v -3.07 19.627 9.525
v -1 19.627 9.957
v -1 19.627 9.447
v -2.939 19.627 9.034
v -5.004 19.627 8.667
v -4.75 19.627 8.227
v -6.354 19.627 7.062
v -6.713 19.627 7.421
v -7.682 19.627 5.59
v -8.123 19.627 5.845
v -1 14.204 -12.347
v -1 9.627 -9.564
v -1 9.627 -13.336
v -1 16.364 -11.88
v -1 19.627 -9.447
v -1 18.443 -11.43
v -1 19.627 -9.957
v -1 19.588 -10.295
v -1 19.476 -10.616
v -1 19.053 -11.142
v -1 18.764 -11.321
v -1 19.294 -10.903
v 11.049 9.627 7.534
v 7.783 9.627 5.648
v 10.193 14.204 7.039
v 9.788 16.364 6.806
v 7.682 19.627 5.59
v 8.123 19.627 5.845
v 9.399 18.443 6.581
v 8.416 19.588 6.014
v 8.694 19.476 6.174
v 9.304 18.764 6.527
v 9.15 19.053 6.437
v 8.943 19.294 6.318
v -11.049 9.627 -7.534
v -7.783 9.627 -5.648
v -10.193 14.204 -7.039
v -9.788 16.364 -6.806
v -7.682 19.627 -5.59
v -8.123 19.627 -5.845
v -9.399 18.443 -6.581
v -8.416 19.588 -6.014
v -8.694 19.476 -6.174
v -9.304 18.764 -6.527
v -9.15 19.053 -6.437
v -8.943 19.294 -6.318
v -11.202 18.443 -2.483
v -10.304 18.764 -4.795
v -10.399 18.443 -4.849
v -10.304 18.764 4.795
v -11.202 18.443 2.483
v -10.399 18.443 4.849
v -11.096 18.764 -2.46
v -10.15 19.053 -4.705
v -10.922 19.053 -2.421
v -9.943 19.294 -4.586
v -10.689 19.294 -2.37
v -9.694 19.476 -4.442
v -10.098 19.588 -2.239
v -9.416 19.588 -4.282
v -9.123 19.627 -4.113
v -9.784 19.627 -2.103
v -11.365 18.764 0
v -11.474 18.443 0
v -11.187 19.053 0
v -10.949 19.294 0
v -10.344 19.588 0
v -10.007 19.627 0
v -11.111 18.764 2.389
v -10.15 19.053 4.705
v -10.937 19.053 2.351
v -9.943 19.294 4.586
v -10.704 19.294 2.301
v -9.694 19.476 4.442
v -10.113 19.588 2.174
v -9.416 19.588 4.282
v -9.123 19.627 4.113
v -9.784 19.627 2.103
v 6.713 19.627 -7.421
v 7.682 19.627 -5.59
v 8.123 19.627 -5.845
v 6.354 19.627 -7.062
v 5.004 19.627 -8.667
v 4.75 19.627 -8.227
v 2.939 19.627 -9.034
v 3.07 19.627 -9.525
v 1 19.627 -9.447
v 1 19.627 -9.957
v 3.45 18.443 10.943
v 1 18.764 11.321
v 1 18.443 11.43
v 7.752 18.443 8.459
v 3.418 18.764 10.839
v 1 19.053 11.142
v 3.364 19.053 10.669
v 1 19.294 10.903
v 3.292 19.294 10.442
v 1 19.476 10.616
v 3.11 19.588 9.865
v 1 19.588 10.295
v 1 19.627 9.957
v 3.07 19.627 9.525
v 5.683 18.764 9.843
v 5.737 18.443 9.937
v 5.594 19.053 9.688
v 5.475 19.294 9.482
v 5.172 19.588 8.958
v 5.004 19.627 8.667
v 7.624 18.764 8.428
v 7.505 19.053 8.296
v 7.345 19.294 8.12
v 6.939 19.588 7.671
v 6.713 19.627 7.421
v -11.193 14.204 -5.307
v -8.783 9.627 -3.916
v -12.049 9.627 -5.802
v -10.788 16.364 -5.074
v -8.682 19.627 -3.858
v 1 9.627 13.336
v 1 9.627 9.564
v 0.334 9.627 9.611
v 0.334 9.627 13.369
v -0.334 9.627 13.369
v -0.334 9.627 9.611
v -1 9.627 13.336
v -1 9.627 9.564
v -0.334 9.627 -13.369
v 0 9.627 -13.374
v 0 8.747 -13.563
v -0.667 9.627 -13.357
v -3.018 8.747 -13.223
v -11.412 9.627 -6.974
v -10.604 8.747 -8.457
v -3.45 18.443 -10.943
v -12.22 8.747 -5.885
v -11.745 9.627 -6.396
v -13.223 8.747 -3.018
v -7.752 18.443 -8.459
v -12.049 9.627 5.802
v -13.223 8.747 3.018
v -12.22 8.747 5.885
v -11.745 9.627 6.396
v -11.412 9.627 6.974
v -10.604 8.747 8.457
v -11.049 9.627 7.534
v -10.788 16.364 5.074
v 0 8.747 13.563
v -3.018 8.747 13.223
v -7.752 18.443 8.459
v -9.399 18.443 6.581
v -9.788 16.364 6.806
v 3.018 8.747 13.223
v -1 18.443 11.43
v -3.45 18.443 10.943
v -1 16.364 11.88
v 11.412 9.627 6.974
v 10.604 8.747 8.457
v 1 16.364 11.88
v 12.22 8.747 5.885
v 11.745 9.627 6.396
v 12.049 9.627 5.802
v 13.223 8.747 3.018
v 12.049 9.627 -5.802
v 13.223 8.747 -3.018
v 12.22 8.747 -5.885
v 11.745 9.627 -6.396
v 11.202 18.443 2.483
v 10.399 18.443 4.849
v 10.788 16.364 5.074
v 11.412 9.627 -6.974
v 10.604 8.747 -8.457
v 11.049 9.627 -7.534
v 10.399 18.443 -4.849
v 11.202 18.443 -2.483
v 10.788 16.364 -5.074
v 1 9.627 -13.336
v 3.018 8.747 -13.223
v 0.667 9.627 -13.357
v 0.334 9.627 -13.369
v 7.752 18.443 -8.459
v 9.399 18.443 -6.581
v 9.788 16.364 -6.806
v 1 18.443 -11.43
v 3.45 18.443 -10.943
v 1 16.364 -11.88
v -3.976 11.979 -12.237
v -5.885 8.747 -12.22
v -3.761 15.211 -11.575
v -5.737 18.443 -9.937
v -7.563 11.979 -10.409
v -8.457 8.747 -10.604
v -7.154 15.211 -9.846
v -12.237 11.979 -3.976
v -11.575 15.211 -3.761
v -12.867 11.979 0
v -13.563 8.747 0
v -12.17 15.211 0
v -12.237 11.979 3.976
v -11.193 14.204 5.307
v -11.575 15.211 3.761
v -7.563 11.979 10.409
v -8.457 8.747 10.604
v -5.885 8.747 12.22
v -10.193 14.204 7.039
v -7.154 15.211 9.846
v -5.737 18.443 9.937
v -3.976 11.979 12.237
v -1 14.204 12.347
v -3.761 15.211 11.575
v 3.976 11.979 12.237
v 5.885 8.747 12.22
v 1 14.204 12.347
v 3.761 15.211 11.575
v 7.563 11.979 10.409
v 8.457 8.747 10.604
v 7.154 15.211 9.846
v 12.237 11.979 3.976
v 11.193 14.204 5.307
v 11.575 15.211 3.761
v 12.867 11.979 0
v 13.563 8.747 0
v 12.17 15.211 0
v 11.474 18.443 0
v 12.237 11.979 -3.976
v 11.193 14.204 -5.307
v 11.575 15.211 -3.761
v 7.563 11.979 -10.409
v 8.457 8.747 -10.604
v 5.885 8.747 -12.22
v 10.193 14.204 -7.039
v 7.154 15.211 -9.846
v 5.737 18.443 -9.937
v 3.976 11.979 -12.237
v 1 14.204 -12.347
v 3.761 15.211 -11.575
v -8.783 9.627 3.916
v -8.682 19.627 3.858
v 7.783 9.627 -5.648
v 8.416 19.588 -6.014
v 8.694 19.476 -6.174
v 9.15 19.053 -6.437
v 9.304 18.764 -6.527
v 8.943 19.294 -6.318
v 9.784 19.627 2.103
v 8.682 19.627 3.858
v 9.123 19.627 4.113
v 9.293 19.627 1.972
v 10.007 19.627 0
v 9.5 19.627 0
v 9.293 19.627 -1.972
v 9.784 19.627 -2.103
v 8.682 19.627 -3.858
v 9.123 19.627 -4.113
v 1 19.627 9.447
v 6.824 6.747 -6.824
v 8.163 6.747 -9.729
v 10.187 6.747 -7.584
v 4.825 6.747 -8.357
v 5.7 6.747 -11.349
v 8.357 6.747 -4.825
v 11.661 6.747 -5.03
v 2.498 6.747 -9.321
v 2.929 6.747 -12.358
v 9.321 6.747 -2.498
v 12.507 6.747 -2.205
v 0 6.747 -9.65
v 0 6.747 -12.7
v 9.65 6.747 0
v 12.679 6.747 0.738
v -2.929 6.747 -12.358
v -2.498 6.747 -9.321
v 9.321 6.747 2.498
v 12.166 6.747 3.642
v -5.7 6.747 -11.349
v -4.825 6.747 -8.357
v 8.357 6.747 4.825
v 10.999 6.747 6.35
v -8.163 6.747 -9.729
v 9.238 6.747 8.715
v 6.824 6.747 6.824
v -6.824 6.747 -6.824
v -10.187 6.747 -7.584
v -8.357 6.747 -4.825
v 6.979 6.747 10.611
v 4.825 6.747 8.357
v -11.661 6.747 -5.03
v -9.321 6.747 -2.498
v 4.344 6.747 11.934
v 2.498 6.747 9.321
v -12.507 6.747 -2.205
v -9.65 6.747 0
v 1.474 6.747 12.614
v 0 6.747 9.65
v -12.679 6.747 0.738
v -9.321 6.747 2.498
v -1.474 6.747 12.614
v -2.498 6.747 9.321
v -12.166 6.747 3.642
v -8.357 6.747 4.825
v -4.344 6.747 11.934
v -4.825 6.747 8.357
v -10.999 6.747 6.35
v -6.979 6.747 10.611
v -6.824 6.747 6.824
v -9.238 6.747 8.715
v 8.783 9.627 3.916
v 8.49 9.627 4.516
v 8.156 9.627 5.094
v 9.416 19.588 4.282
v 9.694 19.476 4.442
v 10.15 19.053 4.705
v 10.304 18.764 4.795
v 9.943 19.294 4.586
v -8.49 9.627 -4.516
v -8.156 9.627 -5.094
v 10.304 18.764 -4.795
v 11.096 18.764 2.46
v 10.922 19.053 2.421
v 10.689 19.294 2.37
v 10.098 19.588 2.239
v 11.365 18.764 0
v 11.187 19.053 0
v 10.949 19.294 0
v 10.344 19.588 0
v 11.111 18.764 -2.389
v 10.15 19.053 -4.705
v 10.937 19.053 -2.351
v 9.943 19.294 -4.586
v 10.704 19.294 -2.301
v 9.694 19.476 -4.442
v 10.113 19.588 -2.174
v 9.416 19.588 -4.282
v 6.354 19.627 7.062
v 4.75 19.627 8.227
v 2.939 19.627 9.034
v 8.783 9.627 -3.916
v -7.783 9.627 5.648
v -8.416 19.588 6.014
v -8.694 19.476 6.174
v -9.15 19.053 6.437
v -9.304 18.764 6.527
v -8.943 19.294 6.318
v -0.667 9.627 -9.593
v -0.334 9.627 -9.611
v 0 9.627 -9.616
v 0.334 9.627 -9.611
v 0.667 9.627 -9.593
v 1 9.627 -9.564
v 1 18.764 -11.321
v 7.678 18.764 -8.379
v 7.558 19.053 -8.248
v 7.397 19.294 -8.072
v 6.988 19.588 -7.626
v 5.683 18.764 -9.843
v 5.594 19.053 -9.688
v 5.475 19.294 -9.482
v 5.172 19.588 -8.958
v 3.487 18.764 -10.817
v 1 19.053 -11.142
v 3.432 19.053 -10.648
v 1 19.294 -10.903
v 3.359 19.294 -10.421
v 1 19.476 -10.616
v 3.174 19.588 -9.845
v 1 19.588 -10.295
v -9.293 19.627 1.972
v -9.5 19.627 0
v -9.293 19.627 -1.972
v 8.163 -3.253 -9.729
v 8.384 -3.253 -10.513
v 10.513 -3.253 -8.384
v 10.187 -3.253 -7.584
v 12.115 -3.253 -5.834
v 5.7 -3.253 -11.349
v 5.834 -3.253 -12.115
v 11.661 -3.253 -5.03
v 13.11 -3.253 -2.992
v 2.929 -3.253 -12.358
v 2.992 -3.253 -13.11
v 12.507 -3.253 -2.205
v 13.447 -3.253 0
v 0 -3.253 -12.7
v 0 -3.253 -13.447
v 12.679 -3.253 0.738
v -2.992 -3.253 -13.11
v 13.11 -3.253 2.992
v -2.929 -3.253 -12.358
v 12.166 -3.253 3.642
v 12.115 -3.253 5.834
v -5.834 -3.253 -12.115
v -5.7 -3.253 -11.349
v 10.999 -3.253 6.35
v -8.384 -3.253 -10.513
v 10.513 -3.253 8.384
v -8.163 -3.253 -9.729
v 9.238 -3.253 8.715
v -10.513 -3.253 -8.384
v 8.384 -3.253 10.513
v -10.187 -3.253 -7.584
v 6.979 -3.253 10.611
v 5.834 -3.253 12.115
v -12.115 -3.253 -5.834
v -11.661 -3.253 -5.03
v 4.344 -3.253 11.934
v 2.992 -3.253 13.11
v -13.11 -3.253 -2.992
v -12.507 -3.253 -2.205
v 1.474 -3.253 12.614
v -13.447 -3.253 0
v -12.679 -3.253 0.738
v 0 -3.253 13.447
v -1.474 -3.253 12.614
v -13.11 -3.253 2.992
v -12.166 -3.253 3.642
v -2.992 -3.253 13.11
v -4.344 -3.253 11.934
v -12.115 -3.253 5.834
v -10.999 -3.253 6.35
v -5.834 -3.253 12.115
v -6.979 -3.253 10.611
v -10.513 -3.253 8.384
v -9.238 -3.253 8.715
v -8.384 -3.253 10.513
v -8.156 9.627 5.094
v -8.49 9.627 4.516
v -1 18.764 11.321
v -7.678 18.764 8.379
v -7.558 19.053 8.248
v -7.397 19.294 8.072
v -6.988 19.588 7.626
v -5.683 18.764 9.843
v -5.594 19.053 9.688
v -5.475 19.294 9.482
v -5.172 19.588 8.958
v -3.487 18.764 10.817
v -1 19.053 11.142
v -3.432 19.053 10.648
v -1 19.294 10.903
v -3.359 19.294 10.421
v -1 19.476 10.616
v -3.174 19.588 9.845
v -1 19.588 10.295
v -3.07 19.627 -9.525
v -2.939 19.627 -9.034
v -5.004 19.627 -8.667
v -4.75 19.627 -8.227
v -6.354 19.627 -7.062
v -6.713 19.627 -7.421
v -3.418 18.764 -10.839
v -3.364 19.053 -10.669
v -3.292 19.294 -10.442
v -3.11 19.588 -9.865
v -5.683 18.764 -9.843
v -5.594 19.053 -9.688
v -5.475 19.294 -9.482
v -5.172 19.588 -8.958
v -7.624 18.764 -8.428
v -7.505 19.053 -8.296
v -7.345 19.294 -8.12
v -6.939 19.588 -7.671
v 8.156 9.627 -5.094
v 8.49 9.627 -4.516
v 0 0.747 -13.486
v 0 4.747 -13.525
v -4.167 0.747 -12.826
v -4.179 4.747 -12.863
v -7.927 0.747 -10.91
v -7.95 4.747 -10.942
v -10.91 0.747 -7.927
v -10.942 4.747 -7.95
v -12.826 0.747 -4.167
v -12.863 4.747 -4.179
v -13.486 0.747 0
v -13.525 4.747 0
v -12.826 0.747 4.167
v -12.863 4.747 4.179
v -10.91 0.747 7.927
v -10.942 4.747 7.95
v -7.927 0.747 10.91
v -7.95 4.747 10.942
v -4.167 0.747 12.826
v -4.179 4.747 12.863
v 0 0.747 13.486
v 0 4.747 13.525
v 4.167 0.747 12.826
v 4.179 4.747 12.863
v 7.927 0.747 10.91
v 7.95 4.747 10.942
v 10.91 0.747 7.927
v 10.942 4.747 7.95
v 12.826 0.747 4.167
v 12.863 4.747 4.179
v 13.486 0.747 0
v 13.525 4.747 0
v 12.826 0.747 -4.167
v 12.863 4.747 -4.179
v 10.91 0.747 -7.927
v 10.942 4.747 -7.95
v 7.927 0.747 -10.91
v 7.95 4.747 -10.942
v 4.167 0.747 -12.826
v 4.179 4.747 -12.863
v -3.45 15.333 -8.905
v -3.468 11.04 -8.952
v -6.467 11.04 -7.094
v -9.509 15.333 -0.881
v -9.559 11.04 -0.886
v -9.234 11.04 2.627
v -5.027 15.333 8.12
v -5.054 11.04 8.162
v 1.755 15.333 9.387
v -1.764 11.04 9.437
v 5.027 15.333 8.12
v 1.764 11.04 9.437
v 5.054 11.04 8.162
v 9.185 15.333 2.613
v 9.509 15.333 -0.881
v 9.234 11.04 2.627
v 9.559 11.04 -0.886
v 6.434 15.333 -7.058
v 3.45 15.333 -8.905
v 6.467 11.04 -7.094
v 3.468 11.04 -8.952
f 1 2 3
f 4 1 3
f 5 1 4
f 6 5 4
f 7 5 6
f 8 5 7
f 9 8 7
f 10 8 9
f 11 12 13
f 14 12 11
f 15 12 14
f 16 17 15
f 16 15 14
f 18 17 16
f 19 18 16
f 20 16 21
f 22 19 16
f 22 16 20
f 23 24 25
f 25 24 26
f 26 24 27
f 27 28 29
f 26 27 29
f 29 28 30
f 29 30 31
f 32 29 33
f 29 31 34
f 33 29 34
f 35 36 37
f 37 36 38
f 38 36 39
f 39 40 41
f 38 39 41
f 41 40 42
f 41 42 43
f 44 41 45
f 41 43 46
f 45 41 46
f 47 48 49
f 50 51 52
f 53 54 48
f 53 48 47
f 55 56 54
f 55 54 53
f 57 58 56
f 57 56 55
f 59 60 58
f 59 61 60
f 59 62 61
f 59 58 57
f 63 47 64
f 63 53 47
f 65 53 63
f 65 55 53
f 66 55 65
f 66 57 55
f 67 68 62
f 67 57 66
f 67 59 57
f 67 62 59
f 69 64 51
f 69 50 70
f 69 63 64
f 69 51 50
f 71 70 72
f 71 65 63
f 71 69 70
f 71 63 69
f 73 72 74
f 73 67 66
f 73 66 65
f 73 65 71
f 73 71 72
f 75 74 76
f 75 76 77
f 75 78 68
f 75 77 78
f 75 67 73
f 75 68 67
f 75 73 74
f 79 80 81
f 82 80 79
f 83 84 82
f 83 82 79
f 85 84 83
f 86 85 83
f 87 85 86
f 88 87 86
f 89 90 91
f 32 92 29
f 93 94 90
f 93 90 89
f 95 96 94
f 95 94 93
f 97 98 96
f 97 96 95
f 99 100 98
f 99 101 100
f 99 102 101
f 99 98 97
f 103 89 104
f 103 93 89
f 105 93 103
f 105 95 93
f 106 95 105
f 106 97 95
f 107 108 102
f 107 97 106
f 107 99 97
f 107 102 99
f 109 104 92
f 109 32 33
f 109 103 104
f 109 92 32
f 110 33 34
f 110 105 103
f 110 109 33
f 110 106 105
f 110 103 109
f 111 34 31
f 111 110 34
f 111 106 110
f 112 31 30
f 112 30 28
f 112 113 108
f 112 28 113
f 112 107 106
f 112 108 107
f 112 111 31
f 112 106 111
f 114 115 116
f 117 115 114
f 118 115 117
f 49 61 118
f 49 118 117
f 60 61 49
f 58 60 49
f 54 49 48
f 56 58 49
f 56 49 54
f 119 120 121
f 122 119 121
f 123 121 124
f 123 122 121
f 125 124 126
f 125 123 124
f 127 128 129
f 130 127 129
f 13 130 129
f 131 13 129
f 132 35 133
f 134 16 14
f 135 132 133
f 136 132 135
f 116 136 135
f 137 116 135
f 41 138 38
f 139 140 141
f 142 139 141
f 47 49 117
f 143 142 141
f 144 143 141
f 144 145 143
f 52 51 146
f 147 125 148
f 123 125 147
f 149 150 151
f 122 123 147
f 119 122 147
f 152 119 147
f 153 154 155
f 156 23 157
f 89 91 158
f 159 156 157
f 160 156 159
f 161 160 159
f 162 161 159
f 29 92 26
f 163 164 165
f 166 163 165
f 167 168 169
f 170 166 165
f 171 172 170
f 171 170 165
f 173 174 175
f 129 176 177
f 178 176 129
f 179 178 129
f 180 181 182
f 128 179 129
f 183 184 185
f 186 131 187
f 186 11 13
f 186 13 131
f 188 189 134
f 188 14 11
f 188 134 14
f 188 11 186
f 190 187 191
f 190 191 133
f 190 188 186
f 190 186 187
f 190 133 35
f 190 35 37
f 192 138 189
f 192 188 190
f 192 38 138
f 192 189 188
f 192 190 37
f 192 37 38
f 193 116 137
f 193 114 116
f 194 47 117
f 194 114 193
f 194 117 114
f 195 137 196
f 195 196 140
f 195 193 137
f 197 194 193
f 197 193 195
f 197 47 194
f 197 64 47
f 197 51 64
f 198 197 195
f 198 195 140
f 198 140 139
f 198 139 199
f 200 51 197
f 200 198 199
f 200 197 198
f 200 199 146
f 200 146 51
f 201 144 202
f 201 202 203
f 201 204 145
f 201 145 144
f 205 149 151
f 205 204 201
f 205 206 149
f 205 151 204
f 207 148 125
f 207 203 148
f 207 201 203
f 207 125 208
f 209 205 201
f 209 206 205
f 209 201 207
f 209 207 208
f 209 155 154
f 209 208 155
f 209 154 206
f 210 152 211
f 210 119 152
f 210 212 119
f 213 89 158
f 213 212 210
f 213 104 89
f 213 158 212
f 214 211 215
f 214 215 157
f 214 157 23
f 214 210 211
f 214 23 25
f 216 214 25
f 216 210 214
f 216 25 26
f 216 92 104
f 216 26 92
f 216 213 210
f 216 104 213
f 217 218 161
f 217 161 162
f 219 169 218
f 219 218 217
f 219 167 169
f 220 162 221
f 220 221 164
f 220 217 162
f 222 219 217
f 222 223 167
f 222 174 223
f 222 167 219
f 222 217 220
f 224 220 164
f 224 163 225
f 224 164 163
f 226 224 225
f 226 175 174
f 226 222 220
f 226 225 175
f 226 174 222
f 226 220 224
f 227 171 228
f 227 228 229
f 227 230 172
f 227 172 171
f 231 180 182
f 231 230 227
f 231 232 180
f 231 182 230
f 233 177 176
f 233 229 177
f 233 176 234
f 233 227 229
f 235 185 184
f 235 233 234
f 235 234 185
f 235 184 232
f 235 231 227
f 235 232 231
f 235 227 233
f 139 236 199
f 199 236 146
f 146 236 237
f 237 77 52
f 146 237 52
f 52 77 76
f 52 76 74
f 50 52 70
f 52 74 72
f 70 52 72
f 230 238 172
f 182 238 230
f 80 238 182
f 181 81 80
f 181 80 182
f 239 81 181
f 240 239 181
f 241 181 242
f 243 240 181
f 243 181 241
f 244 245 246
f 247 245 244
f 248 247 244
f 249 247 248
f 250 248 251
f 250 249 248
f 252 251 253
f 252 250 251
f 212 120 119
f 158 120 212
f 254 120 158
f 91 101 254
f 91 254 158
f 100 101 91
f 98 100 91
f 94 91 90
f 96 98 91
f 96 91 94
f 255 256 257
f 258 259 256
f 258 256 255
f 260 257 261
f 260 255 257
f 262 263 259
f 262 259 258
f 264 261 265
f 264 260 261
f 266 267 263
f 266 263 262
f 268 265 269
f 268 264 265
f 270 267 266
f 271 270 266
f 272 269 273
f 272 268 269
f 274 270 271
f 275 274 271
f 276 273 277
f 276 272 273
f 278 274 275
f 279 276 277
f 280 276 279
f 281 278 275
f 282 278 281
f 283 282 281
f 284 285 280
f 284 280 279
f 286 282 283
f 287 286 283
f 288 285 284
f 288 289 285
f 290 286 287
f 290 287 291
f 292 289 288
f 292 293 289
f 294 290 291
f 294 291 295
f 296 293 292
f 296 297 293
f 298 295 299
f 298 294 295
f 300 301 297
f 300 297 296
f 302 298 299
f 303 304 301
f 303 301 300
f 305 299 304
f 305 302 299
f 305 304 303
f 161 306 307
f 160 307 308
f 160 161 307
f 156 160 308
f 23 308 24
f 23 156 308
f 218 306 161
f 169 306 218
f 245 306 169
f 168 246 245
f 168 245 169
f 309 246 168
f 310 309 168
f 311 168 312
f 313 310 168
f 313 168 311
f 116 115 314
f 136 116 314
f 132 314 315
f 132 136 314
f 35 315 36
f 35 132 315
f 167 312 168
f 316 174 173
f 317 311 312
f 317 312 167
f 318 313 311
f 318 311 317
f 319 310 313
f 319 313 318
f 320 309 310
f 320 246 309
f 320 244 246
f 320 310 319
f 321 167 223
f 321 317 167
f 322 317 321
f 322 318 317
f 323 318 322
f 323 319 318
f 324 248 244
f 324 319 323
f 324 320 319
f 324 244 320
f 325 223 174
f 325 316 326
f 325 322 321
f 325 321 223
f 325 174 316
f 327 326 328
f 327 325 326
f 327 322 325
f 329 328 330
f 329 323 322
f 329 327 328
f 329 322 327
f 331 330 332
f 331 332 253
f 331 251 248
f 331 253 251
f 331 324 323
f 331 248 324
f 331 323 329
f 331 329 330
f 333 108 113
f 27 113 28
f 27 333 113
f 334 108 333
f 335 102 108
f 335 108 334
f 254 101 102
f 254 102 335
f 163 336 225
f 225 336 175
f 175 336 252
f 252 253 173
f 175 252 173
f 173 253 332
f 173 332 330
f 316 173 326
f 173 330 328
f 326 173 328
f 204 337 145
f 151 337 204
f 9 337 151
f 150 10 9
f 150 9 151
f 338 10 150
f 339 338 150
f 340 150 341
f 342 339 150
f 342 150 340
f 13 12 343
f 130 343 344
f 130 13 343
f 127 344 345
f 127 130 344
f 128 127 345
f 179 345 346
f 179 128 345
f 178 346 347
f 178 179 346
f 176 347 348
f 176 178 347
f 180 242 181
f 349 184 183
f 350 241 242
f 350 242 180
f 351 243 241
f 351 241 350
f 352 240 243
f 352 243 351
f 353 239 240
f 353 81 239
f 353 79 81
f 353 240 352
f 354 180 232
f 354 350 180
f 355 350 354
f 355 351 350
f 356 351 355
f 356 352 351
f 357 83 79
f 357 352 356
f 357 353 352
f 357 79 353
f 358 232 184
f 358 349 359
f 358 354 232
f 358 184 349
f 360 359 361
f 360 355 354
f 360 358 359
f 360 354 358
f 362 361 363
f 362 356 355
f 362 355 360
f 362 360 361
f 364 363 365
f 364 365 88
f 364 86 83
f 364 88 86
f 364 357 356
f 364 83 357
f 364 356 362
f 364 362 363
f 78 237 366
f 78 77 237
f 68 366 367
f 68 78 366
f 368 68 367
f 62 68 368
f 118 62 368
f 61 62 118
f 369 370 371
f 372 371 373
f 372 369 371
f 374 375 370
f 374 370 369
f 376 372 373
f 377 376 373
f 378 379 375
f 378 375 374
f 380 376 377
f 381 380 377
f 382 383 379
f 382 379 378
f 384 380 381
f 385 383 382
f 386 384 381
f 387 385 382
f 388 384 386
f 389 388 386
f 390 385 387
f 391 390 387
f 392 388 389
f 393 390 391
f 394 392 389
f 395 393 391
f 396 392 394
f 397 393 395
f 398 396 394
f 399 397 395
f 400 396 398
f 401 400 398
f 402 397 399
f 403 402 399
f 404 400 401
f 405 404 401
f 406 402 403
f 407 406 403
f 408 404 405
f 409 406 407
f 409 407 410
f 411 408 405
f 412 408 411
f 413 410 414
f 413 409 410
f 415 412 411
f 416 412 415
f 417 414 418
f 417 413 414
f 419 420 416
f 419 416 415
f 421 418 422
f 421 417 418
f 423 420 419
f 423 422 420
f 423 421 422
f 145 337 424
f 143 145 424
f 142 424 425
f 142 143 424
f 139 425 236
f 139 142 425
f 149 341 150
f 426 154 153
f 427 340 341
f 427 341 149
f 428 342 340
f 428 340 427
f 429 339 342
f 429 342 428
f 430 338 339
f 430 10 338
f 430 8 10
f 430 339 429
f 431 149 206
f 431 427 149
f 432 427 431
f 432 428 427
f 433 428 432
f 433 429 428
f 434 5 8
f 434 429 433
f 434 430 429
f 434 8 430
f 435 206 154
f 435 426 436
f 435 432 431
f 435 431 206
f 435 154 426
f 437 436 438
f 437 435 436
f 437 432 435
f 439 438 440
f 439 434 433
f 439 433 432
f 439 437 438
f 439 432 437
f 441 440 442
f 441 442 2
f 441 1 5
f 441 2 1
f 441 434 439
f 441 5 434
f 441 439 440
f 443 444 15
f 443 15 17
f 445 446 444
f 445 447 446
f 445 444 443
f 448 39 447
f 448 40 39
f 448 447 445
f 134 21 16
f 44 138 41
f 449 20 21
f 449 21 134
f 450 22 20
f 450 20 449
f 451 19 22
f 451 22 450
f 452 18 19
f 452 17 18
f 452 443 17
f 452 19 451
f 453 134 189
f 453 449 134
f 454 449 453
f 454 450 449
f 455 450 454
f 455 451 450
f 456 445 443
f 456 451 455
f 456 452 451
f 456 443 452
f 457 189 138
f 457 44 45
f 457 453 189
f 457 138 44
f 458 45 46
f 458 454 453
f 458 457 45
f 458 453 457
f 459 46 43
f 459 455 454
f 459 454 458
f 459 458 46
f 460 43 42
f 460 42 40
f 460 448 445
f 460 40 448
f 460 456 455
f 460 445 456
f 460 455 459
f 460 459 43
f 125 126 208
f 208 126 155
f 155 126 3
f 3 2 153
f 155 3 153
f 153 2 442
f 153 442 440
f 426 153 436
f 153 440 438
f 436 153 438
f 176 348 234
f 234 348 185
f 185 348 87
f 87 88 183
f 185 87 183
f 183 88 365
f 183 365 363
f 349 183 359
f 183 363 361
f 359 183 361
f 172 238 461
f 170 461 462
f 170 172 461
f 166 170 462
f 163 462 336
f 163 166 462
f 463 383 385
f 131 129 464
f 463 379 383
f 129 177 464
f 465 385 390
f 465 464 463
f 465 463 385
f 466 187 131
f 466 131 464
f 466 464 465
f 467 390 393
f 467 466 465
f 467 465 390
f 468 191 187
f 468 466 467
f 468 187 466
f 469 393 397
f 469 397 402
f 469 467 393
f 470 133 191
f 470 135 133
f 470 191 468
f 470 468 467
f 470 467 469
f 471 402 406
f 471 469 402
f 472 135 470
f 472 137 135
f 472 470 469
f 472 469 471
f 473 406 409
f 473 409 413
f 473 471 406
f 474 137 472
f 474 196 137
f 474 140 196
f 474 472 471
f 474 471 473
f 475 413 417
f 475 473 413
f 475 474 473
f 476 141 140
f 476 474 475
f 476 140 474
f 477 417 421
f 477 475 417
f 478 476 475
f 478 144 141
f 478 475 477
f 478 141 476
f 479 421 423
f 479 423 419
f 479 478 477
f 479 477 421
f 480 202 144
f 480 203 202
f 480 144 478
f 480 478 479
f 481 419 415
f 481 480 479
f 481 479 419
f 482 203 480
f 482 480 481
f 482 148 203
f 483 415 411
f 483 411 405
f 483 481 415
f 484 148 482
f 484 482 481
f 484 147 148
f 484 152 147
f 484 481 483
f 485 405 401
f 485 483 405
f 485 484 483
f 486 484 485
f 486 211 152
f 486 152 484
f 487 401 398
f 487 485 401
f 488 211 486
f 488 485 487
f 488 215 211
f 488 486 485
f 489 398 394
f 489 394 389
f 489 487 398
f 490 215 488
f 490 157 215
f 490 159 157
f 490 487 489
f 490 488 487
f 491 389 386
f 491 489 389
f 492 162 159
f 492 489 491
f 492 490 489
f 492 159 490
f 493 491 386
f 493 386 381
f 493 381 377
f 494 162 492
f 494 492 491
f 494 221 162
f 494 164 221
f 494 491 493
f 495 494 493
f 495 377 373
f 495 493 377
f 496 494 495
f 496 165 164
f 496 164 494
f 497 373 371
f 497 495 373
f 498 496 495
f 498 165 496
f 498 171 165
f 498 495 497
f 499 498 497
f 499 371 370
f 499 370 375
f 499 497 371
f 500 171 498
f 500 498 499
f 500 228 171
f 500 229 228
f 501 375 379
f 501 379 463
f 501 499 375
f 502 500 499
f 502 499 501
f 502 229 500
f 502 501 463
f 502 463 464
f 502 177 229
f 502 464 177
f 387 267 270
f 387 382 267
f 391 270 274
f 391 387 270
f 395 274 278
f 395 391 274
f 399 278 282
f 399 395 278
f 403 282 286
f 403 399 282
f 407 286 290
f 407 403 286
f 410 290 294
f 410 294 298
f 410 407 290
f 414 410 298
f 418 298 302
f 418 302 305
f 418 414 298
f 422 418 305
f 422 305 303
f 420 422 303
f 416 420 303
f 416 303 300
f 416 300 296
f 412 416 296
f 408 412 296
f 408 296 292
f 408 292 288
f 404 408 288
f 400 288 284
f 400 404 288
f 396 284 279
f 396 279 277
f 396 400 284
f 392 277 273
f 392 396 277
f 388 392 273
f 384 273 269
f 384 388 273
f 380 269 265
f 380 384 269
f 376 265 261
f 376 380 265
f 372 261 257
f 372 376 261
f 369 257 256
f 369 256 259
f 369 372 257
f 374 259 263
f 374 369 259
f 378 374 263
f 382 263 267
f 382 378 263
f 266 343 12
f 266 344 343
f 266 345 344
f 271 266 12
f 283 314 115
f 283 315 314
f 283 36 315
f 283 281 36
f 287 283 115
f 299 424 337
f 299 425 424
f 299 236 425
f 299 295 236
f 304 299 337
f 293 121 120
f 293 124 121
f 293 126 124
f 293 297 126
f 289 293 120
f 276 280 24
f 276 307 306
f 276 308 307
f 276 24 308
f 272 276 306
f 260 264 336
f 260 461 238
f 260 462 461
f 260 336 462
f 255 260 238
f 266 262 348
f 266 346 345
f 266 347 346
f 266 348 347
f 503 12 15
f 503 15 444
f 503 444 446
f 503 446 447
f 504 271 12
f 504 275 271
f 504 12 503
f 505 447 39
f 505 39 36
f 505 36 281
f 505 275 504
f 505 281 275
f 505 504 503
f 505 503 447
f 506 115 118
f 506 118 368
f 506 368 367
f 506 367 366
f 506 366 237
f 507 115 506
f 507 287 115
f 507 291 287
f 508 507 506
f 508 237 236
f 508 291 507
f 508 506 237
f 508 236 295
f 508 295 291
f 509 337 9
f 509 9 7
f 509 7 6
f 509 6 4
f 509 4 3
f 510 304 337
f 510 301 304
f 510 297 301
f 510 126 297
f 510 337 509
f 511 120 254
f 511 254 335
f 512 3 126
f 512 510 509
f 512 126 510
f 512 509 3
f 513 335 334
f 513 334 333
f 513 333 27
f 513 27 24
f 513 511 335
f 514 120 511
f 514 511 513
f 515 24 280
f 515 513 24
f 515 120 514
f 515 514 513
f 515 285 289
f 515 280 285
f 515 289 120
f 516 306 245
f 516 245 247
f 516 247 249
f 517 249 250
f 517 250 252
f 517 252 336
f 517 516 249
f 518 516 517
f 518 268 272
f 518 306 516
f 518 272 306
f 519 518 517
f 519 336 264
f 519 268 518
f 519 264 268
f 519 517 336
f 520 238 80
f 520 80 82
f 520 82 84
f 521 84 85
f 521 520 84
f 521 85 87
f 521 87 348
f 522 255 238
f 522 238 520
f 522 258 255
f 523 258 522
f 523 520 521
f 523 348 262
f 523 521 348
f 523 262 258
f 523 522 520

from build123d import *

# Parameters (mm, degrees)
SKETCH3_W          = 2
SKETCH3_H          = 10.621146273
CUT_EXTRUDE1_DEPTH = 10
CIRPATTERN1_COUNT  = 6


with BuildPart() as part:
    # Sketch1 → Revolve1 (revolve)
    with BuildSketch(Plane.XY, mode=Mode.PRIVATE) as revolve1_sk:
        with BuildLine():
            Line((12.7, -3.253426841), (13.447114034, -3.253426841))
            Line((13.447114034, -3.253426841), (13.563291986, 8.746573159))
            Line((13.563291986, 8.746573159), (11.473793749, 18.442570525))
            ThreePointArc((11.473793749, 18.442570525), (10.949794816, 19.29361987), (10.007456249, 19.626573159))
            Line((10.007456249, 19.626573159), (9.5, 19.626573159))
            Line((9.5, 19.626573159), (9.65, 6.746573159))
            Line((9.65, 6.746573159), (12.7, 6.746573159))
            Line((12.7, 6.746573159), (12.7, -3.253426841))
        make_face()
    revolve(revolve1_sk.sketch.rotate(Axis((0, 0, 0), (0, 1, 0)), 90), axis=Axis((0, 0, 0), (0, 1, 0)))

    # Sketch3 → Cut-Extrude1 (cut)
    with BuildSketch(Plane(origin=(0, 19.626573159, 0), x_dir=(1, 0, 0), z_dir=(0, 1, 0))):
        with Locations((0, 10.007456249)):
            Rectangle(SKETCH3_W, SKETCH3_H)
    cut_extrude1 = extrude(amount=-CUT_EXTRUDE1_DEPTH, mode=Mode.SUBTRACT)

    # CirPattern1: Cut-Extrude1 ×6 about axis
    cirpattern1_axis = Axis((0, 0, 0), (0, 1, 0))
    for i in range(1, CIRPATTERN1_COUNT):
        add(cut_extrude1.rotate(cirpattern1_axis, i * 360 / CIRPATTERN1_COUNT), mode=Mode.SUBTRACT)


solid = part.part
